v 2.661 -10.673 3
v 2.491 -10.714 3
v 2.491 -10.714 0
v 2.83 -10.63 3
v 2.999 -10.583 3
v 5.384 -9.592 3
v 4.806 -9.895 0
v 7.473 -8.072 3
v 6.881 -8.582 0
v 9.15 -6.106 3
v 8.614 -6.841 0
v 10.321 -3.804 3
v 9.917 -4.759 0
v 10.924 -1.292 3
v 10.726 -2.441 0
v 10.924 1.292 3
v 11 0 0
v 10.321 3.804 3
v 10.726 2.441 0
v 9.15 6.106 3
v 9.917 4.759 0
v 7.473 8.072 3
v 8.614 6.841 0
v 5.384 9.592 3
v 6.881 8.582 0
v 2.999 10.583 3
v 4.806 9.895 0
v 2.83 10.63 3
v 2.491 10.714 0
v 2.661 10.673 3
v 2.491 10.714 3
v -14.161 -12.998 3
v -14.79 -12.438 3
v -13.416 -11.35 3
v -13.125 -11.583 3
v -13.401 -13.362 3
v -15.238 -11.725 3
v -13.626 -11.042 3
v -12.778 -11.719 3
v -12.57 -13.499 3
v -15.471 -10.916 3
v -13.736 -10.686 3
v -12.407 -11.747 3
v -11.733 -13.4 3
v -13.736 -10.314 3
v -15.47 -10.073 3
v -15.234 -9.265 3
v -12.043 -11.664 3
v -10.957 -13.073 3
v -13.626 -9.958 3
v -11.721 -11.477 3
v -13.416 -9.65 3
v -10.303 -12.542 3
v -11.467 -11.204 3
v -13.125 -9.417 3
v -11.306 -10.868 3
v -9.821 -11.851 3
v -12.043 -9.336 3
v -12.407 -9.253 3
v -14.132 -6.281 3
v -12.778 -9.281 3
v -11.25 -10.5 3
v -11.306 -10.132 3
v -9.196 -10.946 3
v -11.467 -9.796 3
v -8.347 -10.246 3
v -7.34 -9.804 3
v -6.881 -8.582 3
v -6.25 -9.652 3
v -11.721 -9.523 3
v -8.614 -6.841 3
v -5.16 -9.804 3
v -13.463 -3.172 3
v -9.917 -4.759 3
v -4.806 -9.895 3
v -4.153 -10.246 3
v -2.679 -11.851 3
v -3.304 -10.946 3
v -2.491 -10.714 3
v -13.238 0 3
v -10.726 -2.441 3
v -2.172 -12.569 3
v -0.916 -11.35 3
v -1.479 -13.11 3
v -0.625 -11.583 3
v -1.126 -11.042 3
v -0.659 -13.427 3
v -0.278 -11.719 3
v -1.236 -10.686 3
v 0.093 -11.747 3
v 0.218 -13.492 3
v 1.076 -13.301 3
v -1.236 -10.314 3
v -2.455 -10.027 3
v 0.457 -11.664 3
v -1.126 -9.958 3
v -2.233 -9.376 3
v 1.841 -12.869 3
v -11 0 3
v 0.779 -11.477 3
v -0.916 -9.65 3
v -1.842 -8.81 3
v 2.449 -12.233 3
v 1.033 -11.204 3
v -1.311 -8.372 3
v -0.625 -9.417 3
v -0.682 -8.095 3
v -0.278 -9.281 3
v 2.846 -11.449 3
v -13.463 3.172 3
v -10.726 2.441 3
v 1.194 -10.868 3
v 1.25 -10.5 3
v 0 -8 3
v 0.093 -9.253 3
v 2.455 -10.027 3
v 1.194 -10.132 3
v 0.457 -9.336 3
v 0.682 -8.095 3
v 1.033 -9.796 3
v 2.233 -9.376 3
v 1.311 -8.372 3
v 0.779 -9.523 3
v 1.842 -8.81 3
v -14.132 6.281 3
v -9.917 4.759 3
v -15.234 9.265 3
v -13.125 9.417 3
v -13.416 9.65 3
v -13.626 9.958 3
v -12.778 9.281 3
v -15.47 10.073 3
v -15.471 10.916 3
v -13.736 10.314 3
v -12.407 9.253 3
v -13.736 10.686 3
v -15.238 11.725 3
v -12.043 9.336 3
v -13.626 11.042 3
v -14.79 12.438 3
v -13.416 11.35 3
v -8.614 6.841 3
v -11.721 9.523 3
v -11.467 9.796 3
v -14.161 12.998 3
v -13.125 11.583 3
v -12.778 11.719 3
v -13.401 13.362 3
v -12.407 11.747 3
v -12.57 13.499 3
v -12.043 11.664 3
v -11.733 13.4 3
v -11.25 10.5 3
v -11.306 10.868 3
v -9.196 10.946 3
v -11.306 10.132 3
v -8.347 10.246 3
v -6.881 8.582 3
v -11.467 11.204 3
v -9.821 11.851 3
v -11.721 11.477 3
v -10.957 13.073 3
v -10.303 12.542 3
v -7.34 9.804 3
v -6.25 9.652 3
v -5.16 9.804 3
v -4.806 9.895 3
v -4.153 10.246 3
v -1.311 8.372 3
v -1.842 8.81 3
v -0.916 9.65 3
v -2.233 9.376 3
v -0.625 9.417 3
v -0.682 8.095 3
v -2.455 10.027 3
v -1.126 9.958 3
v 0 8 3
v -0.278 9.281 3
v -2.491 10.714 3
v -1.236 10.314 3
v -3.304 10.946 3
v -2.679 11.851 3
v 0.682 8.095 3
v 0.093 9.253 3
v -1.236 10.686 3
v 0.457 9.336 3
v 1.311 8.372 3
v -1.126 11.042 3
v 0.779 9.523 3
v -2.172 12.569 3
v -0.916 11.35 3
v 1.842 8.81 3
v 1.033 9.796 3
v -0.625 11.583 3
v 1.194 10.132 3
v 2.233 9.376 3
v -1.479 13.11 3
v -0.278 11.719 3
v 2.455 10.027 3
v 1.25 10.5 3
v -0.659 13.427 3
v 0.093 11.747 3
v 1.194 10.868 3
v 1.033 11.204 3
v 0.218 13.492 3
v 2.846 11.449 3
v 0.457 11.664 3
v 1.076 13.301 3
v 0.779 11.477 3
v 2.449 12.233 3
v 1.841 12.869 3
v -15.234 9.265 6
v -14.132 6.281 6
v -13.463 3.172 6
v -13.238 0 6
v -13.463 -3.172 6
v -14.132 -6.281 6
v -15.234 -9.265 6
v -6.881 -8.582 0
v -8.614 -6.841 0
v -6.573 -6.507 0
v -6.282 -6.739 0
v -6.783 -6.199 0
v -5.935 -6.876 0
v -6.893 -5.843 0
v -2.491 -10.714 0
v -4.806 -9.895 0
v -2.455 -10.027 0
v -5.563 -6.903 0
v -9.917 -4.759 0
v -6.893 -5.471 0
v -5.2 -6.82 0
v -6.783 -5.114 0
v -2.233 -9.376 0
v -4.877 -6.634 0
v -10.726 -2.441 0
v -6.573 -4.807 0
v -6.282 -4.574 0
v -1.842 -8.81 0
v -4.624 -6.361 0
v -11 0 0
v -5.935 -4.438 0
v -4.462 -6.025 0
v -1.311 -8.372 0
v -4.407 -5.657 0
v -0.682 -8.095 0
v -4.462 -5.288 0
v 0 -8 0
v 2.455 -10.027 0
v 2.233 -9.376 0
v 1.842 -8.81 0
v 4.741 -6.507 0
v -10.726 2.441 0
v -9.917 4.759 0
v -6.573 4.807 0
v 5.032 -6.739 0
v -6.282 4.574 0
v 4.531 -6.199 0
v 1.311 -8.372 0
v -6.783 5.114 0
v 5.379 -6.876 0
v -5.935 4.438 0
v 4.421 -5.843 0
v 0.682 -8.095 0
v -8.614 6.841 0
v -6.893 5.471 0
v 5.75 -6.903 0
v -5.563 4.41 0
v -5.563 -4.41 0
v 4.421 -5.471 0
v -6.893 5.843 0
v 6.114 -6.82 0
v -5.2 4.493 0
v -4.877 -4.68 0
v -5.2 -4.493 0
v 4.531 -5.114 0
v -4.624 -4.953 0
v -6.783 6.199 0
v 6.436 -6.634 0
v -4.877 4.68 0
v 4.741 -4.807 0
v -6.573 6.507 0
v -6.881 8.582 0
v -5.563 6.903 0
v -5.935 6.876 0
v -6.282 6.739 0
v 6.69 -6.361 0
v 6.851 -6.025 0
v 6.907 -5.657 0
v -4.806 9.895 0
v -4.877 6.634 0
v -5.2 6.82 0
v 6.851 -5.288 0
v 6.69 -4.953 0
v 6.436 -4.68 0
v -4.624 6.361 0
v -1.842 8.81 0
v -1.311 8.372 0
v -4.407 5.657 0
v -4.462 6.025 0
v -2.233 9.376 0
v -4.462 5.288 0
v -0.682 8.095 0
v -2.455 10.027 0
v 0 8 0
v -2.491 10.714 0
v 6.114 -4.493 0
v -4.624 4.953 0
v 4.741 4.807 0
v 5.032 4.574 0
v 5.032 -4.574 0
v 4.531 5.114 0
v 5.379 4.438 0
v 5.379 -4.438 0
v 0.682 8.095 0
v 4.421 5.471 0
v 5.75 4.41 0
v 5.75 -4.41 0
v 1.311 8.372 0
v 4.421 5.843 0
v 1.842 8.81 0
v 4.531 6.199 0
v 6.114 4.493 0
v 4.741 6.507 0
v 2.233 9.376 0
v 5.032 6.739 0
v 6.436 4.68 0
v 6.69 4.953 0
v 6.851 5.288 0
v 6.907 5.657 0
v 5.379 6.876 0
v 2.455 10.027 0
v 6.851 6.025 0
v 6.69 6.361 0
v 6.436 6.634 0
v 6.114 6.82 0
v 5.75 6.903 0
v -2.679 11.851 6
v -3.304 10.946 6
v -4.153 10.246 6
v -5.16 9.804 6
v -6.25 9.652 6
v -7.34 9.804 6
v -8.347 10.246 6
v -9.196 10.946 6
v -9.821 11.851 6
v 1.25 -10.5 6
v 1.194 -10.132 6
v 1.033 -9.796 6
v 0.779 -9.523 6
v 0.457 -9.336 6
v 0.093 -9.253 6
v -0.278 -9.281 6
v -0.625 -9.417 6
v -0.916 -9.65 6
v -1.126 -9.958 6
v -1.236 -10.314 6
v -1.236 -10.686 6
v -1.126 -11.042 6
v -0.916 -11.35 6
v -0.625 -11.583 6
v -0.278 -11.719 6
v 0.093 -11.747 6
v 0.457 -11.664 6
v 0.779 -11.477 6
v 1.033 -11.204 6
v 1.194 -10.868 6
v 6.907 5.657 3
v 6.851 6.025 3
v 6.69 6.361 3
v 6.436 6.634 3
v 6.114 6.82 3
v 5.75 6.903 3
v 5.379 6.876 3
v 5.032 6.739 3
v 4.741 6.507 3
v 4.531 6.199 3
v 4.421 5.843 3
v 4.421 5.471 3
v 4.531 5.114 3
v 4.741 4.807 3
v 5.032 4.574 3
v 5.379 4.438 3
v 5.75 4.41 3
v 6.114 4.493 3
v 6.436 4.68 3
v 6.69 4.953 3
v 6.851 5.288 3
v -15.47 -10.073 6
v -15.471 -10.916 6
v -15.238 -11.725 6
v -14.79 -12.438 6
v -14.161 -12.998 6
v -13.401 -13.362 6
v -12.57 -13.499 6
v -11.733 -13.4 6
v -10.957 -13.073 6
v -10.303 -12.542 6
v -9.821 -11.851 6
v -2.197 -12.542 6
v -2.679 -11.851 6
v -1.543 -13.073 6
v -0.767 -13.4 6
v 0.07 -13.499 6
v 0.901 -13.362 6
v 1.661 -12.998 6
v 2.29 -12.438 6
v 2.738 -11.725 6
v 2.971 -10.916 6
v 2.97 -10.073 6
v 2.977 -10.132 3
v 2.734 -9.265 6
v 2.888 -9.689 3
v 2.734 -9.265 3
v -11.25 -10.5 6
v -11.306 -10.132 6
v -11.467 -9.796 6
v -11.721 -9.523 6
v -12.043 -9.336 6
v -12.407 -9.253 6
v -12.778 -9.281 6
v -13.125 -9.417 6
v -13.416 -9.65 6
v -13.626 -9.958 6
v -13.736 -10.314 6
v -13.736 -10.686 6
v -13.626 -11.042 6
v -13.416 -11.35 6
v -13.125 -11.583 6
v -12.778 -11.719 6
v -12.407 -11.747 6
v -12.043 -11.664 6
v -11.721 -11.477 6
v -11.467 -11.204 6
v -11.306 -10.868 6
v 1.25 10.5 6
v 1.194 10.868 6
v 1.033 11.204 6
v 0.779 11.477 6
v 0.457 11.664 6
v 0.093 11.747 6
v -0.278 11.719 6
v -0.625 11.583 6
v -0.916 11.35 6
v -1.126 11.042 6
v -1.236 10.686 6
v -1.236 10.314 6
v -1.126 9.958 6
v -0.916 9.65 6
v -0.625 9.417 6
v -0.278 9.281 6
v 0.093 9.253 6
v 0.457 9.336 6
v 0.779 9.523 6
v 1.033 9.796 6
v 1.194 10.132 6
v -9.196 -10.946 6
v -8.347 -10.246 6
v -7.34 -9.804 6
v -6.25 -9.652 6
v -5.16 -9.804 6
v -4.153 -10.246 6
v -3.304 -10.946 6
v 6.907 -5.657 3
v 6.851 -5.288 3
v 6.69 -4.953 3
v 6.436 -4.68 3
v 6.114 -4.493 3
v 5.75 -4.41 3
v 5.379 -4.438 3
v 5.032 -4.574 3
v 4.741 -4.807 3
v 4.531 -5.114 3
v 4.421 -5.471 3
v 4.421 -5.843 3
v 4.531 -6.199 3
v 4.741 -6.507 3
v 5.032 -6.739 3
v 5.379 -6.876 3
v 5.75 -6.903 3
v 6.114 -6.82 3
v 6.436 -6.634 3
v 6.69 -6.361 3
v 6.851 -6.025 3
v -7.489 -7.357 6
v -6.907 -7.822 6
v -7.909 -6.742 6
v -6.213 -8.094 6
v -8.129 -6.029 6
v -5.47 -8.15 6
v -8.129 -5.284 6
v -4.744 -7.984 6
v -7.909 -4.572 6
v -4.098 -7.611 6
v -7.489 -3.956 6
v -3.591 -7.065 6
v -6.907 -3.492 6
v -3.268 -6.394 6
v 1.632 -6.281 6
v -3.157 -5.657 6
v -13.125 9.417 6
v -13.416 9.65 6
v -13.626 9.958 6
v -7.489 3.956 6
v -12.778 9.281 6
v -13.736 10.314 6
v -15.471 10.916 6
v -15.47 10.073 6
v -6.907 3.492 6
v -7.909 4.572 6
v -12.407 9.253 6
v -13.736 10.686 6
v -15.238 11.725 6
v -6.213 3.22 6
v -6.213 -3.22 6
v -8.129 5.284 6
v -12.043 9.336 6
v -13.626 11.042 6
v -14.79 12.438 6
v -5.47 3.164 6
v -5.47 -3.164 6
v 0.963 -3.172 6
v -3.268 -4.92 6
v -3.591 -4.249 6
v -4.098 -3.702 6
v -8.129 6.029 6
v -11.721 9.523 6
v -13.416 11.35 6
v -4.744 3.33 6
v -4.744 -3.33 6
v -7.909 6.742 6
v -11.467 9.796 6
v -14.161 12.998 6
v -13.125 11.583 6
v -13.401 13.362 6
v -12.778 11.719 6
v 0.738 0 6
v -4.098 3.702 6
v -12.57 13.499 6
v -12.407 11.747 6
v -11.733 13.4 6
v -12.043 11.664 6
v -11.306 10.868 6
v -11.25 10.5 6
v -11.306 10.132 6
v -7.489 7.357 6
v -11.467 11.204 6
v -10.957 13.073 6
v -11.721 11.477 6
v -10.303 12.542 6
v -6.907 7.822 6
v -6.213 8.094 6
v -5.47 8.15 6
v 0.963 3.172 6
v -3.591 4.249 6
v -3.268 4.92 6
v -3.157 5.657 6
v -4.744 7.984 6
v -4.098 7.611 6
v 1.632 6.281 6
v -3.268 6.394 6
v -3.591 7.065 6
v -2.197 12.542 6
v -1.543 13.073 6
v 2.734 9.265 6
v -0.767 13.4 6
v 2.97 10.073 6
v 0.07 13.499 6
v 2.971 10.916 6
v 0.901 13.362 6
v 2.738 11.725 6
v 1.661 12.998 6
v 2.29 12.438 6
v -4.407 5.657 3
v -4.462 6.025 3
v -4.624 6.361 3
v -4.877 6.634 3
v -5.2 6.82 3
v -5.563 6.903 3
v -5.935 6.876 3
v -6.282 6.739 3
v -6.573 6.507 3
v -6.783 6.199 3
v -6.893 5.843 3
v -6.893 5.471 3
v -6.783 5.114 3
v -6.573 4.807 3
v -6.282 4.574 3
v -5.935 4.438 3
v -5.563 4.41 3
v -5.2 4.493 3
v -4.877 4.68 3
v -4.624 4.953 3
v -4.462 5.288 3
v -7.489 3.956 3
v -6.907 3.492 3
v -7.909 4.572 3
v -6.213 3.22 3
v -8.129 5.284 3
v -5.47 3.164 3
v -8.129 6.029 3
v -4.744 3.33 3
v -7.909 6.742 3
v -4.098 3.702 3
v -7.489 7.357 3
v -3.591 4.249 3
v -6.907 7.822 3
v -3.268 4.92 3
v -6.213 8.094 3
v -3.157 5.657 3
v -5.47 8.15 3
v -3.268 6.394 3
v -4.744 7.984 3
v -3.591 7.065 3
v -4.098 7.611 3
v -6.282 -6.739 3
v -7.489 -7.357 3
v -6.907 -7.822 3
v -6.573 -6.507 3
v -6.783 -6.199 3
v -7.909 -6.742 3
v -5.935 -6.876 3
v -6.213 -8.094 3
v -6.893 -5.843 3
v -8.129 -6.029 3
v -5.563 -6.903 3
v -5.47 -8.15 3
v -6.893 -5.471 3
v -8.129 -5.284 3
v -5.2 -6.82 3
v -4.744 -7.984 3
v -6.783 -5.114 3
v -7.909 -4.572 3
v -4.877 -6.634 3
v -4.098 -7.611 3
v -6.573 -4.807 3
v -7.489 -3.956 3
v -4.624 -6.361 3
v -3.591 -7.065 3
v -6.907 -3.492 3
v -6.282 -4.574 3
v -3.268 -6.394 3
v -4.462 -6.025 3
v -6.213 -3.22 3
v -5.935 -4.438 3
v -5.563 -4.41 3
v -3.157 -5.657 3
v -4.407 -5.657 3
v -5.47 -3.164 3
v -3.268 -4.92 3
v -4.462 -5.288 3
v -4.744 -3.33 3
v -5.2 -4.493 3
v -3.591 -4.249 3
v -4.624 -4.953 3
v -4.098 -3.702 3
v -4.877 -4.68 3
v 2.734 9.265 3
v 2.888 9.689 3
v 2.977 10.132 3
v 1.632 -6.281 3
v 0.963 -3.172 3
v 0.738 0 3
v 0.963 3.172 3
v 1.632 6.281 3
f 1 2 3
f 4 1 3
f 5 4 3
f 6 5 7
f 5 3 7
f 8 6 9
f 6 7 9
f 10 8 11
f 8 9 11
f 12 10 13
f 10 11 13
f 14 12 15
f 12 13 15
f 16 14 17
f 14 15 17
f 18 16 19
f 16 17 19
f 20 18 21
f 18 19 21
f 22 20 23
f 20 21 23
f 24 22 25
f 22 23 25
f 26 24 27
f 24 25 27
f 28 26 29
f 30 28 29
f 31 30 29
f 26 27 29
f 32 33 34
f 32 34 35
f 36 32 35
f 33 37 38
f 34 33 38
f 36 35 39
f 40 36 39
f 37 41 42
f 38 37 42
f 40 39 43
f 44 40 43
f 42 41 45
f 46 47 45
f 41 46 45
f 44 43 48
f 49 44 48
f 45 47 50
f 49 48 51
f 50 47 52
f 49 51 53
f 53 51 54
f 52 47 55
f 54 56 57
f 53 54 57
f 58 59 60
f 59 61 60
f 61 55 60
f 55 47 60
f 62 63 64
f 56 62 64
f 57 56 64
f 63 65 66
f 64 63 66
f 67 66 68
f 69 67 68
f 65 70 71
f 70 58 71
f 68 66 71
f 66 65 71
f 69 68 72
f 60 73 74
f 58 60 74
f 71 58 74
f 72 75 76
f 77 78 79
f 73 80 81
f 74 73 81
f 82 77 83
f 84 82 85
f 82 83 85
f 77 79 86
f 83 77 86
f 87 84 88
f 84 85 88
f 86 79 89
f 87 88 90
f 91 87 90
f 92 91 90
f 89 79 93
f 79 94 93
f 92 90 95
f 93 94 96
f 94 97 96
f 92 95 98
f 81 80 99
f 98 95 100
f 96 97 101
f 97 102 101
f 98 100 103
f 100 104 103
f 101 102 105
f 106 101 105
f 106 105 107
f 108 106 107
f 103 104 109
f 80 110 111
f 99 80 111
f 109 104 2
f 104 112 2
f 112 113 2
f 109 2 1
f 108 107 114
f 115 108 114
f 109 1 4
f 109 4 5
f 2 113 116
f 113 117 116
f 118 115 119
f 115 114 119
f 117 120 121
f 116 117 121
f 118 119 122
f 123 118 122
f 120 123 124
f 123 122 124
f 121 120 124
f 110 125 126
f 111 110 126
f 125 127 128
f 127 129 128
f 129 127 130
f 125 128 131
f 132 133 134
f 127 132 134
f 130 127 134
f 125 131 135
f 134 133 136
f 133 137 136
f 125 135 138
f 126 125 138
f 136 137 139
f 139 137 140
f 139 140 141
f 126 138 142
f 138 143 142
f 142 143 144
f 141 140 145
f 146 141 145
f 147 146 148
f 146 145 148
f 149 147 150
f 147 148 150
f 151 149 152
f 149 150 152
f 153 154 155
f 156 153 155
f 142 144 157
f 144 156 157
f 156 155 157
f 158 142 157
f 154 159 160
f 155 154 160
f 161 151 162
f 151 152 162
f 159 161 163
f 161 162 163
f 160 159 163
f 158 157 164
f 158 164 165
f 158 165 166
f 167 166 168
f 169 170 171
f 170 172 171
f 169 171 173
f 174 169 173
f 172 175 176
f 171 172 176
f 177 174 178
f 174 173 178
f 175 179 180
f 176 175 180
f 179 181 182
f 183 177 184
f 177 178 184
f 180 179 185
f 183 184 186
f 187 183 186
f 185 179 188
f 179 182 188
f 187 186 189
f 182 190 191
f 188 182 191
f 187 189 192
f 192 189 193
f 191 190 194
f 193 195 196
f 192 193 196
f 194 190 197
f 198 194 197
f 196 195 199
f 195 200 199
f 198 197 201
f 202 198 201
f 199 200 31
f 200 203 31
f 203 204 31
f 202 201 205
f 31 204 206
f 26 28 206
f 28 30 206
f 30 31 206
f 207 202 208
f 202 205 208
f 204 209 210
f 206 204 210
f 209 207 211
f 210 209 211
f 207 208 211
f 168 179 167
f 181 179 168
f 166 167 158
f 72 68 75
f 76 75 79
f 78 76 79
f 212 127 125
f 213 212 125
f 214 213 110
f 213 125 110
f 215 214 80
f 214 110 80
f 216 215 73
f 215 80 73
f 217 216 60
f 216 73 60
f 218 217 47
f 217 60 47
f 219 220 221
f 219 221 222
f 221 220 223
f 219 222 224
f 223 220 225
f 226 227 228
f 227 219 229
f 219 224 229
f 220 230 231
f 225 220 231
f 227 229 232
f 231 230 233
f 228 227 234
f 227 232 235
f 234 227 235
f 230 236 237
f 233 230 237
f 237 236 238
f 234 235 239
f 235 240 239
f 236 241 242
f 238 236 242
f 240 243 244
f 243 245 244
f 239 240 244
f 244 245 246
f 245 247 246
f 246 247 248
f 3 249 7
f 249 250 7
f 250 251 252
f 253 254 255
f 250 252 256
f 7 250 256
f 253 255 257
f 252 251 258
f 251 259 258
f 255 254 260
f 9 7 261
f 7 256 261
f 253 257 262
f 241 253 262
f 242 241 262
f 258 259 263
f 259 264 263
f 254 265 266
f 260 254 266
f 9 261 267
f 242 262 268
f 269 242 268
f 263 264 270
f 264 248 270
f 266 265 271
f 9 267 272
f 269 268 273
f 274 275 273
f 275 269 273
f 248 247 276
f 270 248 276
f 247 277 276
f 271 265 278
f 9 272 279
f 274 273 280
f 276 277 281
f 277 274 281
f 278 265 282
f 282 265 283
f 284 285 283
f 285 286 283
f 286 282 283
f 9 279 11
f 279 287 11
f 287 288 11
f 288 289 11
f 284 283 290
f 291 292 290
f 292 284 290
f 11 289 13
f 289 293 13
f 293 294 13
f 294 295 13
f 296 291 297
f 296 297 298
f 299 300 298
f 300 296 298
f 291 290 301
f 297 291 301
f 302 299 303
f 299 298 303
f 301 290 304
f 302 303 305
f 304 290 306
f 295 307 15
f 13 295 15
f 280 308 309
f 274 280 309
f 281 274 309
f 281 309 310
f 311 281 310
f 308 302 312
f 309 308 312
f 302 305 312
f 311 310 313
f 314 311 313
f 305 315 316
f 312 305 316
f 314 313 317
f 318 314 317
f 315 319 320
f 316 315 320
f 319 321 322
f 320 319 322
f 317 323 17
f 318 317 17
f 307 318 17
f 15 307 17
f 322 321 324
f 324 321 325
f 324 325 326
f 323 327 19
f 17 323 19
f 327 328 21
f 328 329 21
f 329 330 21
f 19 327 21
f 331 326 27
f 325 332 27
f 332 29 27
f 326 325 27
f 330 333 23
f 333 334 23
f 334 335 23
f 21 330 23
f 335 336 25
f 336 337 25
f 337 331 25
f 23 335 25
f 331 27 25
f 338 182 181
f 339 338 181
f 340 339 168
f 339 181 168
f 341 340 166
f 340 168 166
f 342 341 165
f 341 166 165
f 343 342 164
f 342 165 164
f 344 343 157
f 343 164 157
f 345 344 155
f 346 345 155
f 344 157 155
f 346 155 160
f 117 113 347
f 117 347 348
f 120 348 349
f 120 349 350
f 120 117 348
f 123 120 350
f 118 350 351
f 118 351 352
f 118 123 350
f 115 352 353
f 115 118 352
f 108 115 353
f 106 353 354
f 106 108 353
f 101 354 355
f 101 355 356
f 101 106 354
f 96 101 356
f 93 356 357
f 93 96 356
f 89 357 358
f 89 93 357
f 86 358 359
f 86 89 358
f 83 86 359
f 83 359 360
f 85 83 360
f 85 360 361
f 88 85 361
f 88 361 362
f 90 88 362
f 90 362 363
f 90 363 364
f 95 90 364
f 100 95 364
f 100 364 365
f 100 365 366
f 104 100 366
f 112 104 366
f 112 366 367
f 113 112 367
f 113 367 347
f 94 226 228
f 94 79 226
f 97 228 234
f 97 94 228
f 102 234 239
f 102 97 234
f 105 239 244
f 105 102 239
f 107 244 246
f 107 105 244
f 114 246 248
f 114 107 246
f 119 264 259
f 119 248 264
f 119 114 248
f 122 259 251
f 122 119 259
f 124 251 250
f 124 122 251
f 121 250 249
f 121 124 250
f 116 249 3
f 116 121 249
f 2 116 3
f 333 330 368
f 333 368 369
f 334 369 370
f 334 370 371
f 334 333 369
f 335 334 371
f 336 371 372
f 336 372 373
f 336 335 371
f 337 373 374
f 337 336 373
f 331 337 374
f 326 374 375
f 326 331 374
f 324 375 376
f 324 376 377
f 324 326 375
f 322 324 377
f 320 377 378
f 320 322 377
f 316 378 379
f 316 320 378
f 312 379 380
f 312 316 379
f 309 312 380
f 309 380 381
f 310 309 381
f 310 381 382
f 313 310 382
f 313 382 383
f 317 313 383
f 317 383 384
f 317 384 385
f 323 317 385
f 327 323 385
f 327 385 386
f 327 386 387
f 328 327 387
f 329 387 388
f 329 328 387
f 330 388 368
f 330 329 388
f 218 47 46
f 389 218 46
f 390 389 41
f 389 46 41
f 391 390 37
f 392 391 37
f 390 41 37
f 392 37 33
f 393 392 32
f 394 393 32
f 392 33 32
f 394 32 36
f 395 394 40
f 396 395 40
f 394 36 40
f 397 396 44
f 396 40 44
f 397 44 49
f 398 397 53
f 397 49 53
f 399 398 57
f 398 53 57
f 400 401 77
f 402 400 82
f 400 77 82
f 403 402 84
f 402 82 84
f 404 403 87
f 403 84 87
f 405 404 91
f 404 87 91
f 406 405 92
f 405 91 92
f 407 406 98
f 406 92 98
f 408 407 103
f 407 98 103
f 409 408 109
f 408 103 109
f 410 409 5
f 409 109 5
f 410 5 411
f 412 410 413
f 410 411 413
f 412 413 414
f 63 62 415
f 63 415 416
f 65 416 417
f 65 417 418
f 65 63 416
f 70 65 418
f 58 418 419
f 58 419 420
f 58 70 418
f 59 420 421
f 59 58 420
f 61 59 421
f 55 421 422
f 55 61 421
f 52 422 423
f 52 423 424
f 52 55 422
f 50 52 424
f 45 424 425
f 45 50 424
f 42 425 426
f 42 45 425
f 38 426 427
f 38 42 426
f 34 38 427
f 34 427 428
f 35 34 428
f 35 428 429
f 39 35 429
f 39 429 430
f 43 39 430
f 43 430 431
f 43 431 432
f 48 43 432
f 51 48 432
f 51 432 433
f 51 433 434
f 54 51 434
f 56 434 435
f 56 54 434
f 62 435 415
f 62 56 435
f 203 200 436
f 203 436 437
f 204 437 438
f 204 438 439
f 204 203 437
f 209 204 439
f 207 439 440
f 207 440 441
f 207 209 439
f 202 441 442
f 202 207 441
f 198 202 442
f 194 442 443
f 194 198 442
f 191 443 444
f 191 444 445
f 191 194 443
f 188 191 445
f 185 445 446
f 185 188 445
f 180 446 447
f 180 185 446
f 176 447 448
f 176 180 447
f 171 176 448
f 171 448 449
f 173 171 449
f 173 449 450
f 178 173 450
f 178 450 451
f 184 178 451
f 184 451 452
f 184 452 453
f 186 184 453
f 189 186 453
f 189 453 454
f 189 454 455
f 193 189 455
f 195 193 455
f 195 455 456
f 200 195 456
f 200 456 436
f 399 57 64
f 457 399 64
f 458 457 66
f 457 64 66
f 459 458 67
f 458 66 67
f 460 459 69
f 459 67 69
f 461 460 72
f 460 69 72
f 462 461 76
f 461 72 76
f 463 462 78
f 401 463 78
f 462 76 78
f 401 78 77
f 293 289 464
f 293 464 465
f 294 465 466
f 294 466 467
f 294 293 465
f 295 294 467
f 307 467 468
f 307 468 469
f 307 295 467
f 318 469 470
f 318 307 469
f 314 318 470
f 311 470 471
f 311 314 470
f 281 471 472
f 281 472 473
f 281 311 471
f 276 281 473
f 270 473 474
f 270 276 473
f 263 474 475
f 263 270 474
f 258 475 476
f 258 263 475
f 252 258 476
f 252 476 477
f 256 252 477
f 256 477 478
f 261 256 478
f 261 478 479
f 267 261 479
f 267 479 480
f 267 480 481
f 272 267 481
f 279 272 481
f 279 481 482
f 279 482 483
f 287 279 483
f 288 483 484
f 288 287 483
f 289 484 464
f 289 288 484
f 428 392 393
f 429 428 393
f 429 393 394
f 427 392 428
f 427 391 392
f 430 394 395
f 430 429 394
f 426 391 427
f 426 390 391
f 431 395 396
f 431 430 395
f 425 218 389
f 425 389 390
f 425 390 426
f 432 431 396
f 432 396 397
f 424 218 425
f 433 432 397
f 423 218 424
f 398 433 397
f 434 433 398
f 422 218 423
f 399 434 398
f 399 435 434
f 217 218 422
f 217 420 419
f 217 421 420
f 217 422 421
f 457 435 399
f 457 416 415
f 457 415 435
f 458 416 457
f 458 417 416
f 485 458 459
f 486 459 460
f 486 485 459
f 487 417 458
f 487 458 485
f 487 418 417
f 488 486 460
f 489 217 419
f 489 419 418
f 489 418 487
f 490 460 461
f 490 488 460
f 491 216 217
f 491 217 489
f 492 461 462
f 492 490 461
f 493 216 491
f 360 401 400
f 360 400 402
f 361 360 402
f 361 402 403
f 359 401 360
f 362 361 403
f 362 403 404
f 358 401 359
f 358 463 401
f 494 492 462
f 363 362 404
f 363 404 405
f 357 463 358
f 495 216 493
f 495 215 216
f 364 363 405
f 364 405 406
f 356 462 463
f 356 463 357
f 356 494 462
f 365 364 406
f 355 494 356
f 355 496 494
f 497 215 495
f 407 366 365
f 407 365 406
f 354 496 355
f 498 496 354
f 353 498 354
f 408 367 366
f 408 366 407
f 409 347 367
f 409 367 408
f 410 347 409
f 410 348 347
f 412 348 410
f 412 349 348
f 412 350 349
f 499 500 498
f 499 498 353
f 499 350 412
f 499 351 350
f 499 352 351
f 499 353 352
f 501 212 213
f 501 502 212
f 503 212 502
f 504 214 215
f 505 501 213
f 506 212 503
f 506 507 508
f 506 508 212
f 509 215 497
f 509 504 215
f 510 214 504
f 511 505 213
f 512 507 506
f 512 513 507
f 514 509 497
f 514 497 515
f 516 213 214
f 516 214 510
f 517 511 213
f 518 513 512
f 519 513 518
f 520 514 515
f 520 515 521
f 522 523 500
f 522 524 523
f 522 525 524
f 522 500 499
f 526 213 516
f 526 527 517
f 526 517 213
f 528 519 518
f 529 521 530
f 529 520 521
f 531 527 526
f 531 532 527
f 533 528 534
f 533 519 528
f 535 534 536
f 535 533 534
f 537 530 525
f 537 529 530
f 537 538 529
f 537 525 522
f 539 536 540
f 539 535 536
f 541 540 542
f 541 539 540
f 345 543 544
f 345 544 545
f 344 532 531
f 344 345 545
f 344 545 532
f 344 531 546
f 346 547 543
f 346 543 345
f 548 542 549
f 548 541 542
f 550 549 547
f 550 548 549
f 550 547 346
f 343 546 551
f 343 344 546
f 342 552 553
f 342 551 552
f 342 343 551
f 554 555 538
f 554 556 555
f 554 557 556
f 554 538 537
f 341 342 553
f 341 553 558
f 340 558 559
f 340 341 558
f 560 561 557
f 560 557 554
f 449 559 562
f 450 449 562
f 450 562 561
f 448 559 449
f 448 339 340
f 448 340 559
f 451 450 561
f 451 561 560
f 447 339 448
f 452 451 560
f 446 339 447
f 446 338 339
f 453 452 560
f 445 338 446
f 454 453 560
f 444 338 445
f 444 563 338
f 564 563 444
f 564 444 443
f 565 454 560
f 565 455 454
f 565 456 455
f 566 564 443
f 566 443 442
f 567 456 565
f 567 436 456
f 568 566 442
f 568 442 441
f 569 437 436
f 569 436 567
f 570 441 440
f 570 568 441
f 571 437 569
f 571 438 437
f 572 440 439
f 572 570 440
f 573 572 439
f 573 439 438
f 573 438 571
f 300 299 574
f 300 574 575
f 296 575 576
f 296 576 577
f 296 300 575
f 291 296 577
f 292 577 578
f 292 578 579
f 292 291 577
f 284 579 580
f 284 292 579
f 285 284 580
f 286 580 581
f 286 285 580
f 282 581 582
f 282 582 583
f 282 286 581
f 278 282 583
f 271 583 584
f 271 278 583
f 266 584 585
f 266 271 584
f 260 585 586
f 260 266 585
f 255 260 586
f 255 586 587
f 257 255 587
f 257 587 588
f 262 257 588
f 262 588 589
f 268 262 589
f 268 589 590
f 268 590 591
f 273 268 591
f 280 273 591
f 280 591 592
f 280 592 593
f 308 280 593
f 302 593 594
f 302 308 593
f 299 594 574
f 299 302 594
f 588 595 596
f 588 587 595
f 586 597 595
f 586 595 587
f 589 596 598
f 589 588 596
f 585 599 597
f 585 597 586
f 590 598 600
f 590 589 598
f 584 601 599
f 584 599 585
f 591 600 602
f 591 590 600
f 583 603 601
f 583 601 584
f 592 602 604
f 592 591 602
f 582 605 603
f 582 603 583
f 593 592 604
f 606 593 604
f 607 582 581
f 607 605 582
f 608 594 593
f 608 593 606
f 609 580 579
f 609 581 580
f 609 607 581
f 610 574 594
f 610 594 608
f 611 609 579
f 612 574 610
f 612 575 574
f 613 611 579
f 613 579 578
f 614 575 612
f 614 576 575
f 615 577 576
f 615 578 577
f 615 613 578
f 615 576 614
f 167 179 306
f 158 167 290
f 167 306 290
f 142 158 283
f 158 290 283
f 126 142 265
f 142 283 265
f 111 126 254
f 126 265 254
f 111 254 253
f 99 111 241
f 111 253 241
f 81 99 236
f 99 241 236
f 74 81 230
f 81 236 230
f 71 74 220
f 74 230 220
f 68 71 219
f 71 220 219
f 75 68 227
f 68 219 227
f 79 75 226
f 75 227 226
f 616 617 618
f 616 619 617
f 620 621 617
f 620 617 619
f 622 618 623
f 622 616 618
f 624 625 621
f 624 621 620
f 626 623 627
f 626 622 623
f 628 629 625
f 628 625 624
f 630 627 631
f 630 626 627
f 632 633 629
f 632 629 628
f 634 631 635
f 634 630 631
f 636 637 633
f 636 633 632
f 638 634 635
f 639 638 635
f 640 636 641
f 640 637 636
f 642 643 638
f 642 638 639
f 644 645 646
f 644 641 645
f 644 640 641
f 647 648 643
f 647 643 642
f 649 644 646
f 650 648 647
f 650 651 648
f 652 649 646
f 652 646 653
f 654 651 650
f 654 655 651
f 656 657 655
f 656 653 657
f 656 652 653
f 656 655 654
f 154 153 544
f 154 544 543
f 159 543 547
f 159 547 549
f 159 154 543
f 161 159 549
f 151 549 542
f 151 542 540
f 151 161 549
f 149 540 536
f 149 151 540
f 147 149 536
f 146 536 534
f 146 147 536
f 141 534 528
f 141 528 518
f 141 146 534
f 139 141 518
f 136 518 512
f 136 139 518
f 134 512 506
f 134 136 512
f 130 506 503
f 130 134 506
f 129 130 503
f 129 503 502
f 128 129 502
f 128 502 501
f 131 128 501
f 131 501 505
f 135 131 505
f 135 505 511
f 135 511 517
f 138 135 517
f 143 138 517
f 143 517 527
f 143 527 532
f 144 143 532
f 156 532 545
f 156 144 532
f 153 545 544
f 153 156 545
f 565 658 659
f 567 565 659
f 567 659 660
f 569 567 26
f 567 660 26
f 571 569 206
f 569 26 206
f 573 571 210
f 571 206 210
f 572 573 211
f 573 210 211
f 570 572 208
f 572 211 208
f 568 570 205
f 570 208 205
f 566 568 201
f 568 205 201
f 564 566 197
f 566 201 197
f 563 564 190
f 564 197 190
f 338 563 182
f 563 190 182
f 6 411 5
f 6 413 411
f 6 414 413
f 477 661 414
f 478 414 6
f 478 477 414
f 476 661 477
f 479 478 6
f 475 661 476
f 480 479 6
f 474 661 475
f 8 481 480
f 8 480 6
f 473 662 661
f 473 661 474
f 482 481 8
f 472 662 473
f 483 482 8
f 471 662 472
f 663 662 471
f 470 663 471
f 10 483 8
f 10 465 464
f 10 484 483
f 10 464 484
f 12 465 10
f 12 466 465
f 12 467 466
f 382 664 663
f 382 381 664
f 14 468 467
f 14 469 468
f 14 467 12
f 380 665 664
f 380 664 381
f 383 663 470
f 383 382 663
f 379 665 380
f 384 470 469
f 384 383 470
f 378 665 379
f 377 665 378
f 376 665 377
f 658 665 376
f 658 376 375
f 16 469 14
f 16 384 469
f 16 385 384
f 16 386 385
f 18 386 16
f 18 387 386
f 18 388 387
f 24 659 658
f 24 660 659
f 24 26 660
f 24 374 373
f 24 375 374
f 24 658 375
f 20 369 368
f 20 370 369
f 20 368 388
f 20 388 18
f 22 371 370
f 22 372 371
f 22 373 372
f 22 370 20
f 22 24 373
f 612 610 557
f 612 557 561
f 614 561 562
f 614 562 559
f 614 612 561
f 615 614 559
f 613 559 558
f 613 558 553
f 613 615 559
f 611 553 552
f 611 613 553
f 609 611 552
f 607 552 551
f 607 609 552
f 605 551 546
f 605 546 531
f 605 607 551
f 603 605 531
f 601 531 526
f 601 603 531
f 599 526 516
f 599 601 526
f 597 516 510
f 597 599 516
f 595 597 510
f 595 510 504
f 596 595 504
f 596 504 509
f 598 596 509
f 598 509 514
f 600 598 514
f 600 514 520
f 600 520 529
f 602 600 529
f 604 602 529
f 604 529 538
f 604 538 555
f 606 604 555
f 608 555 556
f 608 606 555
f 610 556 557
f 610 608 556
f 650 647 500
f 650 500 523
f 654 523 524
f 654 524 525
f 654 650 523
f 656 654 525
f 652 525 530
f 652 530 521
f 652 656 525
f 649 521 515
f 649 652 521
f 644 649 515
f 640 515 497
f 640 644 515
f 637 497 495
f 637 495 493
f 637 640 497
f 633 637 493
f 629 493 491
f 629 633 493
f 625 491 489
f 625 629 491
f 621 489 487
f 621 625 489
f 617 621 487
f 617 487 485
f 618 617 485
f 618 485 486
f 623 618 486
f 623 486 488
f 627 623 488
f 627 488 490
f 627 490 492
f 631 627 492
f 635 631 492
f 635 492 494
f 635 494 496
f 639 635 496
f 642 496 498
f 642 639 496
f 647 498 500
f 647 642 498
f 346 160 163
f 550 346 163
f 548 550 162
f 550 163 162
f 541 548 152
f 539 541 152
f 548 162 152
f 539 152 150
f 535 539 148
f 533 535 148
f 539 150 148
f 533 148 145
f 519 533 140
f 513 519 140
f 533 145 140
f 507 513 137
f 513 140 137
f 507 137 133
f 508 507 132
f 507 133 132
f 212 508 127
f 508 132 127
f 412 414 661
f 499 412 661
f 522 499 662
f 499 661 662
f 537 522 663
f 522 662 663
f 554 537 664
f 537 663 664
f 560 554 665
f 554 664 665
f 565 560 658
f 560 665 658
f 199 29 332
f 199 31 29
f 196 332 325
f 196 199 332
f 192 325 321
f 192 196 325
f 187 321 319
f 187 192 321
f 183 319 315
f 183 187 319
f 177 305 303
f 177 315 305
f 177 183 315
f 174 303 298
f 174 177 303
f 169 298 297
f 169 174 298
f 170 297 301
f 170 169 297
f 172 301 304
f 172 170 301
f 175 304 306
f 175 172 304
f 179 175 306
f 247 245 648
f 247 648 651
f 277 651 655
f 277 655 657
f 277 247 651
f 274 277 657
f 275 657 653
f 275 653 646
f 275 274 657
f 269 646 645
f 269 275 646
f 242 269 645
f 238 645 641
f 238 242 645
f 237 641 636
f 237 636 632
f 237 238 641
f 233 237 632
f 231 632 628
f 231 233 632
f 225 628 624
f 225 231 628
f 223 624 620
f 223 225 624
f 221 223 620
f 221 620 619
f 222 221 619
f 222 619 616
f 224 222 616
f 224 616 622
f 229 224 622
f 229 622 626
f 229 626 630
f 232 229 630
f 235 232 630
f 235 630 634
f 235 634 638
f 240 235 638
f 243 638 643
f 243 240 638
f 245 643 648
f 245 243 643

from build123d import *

# Parameters (mm, degrees)
F0_R     = 11
F0_R_2   = 1.25
F1_DEPTH = 3
F2_R     = 1.25
F2_R_2   = 2.5
F3_DEPTH = 3
F4_R     = 2.5
F5_DEPTH = 5


with BuildPart() as f1:
    # F0 (on Top) → F1 (new body)
    with BuildSketch(Plane.XY):
        Circle(F0_R)
        with Locations((-5.656854, -5.656854)):
            Circle(F0_R_2, mode=Mode.SUBTRACT)
        with Locations((5.656854, -5.656854)):
            Circle(F0_R_2, mode=Mode.SUBTRACT)
        with Locations((-5.656854, 5.656854)):
            Circle(F0_R_2, mode=Mode.SUBTRACT)
        with Locations((5.656854, 5.656854)):
            Circle(F0_R_2, mode=Mode.SUBTRACT)
    extrude(amount=F1_DEPTH)

    # F2 (on face) → F3 (join)
    with BuildSketch(Plane.XY.offset(3)):
        with BuildLine():
            ThreePointArc((-15.233871, 9.264706), (-13.2379, 0), (-15.233871, -9.264706))
            ThreePointArc((-15.233871, -9.264706), (-13.793453, -13.20684), (-9.821429, -11.85102))
            ThreePointArc((-9.821429, -11.85102), (-6.25, -9.65238), (-2.678571, -11.85102))
            ThreePointArc((-2.678571, -11.85102), (1.293453, -13.20684), (2.733871, -9.264706))
            ThreePointArc((2.733871, -9.264706), (0.7379, 0), (2.733871, 9.264706))
            ThreePointArc((2.733871, 9.264706), (1.293453, 13.20684), (-2.678571, 11.85102))
            ThreePointArc((-2.678571, 11.85102), (-6.25, 9.65238), (-9.821429, 11.85102))
            ThreePointArc((-9.821429, 11.85102), (-13.793453, 13.20684), (-15.233871, 9.264706))
        make_face()
        with Locations((-12.5, -10.5)):
            Circle(F2_R, mode=Mode.SUBTRACT)
        with Locations((0, -10.5)):
            Circle(F2_R, mode=Mode.SUBTRACT)
        with Locations((-5.656854, -5.656854)):
            Circle(F2_R_2, mode=Mode.SUBTRACT)
        with Locations((-12.5, 10.5)):
            Circle(F2_R, mode=Mode.SUBTRACT)
        with Locations((-5.656854, 5.656854)):
            Circle(F2_R_2, mode=Mode.SUBTRACT)
        with Locations((0, 10.5)):
            Circle(F2_R, mode=Mode.SUBTRACT)
    extrude(amount=F3_DEPTH)

    # F4 (on face) → F5 (cut)
    with BuildSketch(Plane(origin=(0, 0, 3), x_dir=(1, 0, 0), z_dir=(0, 0, -1))):
        with Locations((0, 10.5)):
            Circle(F4_R)
        with Locations((0, -10.5)):
            Circle(F4_R)
    extrude(amount=F5_DEPTH, mode=Mode.SUBTRACT)


solid = f1.part
